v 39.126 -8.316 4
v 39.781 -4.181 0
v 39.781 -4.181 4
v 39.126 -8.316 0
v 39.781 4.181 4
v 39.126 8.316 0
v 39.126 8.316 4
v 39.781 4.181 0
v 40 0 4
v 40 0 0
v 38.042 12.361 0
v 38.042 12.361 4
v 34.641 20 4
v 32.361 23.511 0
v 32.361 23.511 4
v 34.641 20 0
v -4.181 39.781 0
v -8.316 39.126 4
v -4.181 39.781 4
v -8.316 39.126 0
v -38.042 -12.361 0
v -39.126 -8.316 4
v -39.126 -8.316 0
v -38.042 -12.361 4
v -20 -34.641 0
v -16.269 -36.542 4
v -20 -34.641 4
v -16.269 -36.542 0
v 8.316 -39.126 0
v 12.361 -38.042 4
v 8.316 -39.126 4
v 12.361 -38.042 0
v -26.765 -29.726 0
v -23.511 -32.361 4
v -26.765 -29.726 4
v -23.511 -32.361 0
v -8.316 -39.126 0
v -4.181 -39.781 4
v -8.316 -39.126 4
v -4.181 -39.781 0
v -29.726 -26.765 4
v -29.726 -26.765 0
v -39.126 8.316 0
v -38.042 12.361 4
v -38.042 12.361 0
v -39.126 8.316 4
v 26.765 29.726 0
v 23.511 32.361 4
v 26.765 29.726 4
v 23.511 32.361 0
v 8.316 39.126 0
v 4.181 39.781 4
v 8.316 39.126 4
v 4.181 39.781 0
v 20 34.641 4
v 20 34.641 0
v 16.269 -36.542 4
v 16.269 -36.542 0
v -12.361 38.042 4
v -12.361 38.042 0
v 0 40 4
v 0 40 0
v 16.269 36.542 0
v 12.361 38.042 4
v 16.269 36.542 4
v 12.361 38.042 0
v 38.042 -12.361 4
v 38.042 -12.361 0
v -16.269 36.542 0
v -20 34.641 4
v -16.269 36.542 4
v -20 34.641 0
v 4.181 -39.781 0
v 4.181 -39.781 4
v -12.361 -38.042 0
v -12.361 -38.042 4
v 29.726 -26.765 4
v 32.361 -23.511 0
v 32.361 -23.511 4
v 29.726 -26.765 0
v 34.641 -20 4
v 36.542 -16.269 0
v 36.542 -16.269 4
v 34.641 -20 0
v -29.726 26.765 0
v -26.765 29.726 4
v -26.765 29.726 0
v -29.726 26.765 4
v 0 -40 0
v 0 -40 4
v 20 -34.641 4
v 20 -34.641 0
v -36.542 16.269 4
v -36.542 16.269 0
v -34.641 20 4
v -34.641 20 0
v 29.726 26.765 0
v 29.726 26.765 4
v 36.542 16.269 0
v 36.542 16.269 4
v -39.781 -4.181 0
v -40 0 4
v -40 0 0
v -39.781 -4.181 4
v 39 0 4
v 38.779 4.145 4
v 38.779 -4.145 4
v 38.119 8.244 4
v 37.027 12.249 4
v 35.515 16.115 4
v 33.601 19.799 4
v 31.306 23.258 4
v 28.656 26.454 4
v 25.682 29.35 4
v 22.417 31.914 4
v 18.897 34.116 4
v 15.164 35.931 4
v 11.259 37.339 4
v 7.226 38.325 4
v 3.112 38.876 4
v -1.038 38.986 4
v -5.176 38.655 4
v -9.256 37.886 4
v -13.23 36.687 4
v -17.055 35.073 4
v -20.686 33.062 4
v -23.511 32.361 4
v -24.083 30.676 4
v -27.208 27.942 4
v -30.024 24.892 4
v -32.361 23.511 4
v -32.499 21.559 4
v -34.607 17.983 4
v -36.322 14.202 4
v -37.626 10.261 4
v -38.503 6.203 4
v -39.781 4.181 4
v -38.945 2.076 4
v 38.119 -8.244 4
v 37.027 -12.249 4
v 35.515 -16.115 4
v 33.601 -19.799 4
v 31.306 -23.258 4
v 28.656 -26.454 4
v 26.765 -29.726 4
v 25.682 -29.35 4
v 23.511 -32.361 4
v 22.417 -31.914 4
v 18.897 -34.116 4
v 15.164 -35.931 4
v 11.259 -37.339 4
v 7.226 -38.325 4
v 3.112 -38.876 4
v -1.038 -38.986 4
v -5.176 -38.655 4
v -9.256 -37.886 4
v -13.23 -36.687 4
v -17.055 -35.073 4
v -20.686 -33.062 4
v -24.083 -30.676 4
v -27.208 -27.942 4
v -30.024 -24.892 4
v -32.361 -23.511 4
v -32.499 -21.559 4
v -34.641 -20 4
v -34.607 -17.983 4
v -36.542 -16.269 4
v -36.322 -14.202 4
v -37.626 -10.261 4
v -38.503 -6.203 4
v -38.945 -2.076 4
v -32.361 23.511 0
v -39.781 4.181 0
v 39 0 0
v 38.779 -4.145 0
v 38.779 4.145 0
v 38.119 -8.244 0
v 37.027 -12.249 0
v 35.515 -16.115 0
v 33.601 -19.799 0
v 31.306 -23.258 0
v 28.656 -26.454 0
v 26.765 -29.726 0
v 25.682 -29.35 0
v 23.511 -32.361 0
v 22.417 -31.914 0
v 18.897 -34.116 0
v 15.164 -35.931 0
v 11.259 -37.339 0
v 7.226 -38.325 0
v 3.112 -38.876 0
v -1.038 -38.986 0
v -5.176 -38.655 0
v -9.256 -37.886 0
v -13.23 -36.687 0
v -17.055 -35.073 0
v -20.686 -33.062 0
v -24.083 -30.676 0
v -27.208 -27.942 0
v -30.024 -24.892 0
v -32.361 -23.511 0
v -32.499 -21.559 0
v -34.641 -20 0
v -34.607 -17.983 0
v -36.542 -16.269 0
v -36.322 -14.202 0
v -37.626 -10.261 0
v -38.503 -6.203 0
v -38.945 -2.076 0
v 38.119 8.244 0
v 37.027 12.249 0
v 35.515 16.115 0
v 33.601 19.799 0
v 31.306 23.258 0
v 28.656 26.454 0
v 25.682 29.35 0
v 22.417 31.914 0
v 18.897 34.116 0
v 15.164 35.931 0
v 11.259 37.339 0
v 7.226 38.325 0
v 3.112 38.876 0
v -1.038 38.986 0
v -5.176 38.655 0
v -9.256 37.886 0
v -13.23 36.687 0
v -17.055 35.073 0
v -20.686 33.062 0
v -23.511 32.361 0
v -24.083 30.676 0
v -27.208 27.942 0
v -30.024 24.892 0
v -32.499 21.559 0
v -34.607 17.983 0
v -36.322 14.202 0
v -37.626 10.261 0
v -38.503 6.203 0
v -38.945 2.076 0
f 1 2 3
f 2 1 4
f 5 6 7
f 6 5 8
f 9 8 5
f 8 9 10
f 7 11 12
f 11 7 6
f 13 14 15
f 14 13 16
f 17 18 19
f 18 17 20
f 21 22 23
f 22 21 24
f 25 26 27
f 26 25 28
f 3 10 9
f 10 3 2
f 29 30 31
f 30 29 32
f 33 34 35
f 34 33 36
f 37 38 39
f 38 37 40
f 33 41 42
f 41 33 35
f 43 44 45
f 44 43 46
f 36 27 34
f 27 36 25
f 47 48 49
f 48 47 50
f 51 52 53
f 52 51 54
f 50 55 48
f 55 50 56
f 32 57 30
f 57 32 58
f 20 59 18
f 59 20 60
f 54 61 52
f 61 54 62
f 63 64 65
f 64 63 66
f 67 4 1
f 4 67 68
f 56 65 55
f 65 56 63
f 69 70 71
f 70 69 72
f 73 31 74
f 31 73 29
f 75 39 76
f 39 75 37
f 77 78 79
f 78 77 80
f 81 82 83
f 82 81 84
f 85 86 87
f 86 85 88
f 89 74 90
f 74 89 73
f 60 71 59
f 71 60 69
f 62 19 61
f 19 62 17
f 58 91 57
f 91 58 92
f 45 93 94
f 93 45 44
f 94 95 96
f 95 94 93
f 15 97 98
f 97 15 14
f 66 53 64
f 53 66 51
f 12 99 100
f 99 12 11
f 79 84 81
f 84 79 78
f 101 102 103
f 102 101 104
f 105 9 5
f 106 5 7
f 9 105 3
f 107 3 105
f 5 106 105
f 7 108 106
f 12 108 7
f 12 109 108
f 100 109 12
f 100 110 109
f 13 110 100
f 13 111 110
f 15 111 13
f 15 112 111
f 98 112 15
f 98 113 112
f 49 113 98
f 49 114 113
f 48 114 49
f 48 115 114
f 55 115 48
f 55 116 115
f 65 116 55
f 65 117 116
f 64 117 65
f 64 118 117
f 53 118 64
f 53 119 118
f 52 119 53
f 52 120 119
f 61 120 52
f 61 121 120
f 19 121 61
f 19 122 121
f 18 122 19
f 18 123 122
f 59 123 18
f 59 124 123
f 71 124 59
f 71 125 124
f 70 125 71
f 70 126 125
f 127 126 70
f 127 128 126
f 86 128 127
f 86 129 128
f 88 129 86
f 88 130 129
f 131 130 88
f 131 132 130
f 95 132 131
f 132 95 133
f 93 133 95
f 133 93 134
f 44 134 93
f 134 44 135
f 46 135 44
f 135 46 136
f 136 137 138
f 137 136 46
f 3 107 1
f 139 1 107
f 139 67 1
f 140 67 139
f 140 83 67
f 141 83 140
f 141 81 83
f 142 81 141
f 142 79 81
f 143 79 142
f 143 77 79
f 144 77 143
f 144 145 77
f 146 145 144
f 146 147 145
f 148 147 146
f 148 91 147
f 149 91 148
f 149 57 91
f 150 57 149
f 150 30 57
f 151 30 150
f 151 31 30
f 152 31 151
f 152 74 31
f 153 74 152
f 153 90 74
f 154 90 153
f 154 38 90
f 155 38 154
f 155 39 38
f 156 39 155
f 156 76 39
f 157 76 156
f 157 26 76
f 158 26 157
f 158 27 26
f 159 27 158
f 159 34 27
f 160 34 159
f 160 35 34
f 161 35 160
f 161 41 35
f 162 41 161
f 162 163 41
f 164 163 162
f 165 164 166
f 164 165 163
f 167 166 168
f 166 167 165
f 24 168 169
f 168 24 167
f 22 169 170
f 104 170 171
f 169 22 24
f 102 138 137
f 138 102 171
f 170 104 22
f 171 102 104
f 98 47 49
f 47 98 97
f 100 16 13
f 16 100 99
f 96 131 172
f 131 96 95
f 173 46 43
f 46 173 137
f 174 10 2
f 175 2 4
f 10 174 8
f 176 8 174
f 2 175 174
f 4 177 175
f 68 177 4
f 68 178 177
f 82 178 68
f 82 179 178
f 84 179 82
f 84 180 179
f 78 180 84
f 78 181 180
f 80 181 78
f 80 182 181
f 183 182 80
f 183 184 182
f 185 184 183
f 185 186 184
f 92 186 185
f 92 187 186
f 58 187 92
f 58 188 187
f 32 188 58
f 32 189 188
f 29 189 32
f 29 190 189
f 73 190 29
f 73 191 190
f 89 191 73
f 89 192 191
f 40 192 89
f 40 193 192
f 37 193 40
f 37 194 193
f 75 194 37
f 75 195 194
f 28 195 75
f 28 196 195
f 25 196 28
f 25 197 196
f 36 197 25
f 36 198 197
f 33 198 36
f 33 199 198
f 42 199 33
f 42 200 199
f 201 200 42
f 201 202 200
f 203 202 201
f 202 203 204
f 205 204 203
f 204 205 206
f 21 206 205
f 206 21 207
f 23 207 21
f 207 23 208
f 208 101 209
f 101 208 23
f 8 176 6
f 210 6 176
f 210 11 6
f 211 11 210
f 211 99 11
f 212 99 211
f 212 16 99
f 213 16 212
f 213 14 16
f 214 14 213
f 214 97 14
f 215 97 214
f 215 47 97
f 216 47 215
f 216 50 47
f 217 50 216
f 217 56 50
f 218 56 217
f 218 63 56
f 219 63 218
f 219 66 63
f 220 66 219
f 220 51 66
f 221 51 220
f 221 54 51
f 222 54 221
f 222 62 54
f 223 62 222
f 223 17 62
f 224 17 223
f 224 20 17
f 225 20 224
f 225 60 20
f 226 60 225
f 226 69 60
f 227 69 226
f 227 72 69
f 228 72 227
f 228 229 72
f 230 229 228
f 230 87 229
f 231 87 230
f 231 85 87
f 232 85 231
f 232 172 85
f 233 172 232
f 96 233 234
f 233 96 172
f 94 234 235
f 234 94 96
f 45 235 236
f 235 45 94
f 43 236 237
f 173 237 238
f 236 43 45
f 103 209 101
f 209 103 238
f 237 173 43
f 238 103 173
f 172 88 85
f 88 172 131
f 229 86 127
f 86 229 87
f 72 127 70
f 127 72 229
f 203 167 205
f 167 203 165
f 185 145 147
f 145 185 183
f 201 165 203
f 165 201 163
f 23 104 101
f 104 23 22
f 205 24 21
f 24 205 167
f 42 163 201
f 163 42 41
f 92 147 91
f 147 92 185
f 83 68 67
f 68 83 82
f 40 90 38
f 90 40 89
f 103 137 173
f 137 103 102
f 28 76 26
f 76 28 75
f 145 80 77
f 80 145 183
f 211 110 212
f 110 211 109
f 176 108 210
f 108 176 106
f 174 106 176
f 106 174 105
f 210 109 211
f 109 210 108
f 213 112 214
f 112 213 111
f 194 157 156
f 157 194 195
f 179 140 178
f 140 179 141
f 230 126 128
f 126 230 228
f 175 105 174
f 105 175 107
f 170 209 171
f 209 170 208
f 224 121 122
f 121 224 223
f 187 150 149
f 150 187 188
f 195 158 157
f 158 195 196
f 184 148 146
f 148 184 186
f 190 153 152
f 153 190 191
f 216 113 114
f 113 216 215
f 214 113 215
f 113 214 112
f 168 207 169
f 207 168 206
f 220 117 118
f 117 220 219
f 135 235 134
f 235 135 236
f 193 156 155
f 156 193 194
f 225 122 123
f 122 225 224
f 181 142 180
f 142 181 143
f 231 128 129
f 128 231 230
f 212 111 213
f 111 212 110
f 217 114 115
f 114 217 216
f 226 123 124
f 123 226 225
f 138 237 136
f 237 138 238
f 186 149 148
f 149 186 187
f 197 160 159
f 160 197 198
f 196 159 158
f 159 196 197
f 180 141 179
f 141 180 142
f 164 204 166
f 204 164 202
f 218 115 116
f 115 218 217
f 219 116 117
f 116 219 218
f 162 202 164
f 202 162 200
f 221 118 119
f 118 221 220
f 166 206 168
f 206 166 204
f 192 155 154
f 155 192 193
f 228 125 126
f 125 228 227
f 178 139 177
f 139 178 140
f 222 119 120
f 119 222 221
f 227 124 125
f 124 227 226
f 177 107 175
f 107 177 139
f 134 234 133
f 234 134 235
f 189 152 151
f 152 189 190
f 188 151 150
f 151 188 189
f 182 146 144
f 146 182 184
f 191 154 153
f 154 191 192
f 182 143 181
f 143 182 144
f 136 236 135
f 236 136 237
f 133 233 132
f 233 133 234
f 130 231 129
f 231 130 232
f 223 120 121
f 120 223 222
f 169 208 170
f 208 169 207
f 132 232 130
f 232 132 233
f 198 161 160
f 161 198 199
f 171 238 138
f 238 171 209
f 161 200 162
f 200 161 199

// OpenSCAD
difference() {
	cylinder(r=40, $fn=60, h=4);
	translate([0, 0, -1]) {
		cylinder(r=39, $fn=59, h=6);
	}
}
